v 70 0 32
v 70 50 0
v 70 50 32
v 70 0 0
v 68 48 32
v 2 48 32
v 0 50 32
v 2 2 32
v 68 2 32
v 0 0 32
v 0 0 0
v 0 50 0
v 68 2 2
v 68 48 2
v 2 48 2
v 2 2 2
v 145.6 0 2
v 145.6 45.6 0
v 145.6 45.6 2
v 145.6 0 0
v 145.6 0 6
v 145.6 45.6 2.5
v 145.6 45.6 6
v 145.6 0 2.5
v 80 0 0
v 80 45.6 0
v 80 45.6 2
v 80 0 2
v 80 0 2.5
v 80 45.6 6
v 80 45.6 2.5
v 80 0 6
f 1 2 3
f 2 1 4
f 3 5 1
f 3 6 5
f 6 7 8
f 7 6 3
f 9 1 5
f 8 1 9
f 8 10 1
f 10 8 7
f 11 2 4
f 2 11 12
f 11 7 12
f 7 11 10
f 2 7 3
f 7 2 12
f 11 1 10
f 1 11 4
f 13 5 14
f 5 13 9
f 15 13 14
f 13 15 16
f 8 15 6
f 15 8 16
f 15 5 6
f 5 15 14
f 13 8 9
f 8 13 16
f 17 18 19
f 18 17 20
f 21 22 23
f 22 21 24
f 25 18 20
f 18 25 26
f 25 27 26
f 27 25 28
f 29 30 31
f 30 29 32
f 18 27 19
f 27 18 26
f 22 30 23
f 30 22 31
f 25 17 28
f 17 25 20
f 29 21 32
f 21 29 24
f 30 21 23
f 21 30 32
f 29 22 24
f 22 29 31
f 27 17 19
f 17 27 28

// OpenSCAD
// Two-part enclosure for a small electronics board (e.g. Arduino-based temperature logger)
// Prints together in one job: box on the left, upside-down lid on the right, with a 10 mm gap.
// Units: mm. Wall thicknesses are 2 mm (box) and 1.5 mm (lid), with a 0.2 mm clearance
// between lid and box so they do not fuse.

// ---------------- Parameters ----------------
box_x      = 70;    // box outer length (X)
box_y      = 50;    // box outer width (Y)
box_z      = 30;    // box outer height (Z)
wall       = 2;     // box wall thickness
floor      = 2;     // box floor thickness

lip_t      = 1.5;   // lid lip wall thickness
lip_h      = 4;     // lid lip height (from plate top)
lip_x      = 65.6;  // lid lip outer length (X)
lip_y      = 45.6;  // lid lip outer width (Y)

gap        = 10;    // horizontal gap between box and lid
eps        = 0.5;   // overshoot for clean boolean cuts

$fn = 64;

// Derived: lid plate thickness = lip height - wall thickness = 2.5 mm
plate_t = lip_h - wall;   // 2.5 mm overlap of the lip into the box

// ---------------- Model ----------------
union() {
    // Part 1: Box, open top, centred in X/Y, resting on z = 0
    difference() {
        cube([box_x, box_y, box_z + floor]);
        translate([wall, wall, floor])
            cube([box_x - 2 * wall, box_y - 2 * wall, box_z + 1]);   // open-top cavity
    }

    // Part 2: Lid, printed upside down. Plate lies on the bed; the lip (a wall with the
    // same outer dimensions as the box opening) overhangs the plate by plate_t and rises
    // lip_h above the plate top. Positioned on the +X side of the box with the specified gap.
    translate([box_x + gap, 0, 0])
        difference() {
            union() {
                // Base plate
                translate([0, 0, 0])
                    cube([lip_x, lip_y, plate_t]);
                // Lip: wall 1.5 mm thick, 4 mm tall, centred on the plate
                translate([(lip_x - 65.6) / 2, (lip_y - 45.6) / 2, plate_t])
                    cube([65.6, 45.6, lip_h]);
            }
            // Small cutout under the lip centre so it does not fuse with the box floor
            translate([(lip_x - 65.6) / 2 - eps, (lip_y - 45.6) / 2 - eps, plate_t])
                cube([65.6 + 2 * eps, 45.6 + 2 * eps, eps]);
        }
}
